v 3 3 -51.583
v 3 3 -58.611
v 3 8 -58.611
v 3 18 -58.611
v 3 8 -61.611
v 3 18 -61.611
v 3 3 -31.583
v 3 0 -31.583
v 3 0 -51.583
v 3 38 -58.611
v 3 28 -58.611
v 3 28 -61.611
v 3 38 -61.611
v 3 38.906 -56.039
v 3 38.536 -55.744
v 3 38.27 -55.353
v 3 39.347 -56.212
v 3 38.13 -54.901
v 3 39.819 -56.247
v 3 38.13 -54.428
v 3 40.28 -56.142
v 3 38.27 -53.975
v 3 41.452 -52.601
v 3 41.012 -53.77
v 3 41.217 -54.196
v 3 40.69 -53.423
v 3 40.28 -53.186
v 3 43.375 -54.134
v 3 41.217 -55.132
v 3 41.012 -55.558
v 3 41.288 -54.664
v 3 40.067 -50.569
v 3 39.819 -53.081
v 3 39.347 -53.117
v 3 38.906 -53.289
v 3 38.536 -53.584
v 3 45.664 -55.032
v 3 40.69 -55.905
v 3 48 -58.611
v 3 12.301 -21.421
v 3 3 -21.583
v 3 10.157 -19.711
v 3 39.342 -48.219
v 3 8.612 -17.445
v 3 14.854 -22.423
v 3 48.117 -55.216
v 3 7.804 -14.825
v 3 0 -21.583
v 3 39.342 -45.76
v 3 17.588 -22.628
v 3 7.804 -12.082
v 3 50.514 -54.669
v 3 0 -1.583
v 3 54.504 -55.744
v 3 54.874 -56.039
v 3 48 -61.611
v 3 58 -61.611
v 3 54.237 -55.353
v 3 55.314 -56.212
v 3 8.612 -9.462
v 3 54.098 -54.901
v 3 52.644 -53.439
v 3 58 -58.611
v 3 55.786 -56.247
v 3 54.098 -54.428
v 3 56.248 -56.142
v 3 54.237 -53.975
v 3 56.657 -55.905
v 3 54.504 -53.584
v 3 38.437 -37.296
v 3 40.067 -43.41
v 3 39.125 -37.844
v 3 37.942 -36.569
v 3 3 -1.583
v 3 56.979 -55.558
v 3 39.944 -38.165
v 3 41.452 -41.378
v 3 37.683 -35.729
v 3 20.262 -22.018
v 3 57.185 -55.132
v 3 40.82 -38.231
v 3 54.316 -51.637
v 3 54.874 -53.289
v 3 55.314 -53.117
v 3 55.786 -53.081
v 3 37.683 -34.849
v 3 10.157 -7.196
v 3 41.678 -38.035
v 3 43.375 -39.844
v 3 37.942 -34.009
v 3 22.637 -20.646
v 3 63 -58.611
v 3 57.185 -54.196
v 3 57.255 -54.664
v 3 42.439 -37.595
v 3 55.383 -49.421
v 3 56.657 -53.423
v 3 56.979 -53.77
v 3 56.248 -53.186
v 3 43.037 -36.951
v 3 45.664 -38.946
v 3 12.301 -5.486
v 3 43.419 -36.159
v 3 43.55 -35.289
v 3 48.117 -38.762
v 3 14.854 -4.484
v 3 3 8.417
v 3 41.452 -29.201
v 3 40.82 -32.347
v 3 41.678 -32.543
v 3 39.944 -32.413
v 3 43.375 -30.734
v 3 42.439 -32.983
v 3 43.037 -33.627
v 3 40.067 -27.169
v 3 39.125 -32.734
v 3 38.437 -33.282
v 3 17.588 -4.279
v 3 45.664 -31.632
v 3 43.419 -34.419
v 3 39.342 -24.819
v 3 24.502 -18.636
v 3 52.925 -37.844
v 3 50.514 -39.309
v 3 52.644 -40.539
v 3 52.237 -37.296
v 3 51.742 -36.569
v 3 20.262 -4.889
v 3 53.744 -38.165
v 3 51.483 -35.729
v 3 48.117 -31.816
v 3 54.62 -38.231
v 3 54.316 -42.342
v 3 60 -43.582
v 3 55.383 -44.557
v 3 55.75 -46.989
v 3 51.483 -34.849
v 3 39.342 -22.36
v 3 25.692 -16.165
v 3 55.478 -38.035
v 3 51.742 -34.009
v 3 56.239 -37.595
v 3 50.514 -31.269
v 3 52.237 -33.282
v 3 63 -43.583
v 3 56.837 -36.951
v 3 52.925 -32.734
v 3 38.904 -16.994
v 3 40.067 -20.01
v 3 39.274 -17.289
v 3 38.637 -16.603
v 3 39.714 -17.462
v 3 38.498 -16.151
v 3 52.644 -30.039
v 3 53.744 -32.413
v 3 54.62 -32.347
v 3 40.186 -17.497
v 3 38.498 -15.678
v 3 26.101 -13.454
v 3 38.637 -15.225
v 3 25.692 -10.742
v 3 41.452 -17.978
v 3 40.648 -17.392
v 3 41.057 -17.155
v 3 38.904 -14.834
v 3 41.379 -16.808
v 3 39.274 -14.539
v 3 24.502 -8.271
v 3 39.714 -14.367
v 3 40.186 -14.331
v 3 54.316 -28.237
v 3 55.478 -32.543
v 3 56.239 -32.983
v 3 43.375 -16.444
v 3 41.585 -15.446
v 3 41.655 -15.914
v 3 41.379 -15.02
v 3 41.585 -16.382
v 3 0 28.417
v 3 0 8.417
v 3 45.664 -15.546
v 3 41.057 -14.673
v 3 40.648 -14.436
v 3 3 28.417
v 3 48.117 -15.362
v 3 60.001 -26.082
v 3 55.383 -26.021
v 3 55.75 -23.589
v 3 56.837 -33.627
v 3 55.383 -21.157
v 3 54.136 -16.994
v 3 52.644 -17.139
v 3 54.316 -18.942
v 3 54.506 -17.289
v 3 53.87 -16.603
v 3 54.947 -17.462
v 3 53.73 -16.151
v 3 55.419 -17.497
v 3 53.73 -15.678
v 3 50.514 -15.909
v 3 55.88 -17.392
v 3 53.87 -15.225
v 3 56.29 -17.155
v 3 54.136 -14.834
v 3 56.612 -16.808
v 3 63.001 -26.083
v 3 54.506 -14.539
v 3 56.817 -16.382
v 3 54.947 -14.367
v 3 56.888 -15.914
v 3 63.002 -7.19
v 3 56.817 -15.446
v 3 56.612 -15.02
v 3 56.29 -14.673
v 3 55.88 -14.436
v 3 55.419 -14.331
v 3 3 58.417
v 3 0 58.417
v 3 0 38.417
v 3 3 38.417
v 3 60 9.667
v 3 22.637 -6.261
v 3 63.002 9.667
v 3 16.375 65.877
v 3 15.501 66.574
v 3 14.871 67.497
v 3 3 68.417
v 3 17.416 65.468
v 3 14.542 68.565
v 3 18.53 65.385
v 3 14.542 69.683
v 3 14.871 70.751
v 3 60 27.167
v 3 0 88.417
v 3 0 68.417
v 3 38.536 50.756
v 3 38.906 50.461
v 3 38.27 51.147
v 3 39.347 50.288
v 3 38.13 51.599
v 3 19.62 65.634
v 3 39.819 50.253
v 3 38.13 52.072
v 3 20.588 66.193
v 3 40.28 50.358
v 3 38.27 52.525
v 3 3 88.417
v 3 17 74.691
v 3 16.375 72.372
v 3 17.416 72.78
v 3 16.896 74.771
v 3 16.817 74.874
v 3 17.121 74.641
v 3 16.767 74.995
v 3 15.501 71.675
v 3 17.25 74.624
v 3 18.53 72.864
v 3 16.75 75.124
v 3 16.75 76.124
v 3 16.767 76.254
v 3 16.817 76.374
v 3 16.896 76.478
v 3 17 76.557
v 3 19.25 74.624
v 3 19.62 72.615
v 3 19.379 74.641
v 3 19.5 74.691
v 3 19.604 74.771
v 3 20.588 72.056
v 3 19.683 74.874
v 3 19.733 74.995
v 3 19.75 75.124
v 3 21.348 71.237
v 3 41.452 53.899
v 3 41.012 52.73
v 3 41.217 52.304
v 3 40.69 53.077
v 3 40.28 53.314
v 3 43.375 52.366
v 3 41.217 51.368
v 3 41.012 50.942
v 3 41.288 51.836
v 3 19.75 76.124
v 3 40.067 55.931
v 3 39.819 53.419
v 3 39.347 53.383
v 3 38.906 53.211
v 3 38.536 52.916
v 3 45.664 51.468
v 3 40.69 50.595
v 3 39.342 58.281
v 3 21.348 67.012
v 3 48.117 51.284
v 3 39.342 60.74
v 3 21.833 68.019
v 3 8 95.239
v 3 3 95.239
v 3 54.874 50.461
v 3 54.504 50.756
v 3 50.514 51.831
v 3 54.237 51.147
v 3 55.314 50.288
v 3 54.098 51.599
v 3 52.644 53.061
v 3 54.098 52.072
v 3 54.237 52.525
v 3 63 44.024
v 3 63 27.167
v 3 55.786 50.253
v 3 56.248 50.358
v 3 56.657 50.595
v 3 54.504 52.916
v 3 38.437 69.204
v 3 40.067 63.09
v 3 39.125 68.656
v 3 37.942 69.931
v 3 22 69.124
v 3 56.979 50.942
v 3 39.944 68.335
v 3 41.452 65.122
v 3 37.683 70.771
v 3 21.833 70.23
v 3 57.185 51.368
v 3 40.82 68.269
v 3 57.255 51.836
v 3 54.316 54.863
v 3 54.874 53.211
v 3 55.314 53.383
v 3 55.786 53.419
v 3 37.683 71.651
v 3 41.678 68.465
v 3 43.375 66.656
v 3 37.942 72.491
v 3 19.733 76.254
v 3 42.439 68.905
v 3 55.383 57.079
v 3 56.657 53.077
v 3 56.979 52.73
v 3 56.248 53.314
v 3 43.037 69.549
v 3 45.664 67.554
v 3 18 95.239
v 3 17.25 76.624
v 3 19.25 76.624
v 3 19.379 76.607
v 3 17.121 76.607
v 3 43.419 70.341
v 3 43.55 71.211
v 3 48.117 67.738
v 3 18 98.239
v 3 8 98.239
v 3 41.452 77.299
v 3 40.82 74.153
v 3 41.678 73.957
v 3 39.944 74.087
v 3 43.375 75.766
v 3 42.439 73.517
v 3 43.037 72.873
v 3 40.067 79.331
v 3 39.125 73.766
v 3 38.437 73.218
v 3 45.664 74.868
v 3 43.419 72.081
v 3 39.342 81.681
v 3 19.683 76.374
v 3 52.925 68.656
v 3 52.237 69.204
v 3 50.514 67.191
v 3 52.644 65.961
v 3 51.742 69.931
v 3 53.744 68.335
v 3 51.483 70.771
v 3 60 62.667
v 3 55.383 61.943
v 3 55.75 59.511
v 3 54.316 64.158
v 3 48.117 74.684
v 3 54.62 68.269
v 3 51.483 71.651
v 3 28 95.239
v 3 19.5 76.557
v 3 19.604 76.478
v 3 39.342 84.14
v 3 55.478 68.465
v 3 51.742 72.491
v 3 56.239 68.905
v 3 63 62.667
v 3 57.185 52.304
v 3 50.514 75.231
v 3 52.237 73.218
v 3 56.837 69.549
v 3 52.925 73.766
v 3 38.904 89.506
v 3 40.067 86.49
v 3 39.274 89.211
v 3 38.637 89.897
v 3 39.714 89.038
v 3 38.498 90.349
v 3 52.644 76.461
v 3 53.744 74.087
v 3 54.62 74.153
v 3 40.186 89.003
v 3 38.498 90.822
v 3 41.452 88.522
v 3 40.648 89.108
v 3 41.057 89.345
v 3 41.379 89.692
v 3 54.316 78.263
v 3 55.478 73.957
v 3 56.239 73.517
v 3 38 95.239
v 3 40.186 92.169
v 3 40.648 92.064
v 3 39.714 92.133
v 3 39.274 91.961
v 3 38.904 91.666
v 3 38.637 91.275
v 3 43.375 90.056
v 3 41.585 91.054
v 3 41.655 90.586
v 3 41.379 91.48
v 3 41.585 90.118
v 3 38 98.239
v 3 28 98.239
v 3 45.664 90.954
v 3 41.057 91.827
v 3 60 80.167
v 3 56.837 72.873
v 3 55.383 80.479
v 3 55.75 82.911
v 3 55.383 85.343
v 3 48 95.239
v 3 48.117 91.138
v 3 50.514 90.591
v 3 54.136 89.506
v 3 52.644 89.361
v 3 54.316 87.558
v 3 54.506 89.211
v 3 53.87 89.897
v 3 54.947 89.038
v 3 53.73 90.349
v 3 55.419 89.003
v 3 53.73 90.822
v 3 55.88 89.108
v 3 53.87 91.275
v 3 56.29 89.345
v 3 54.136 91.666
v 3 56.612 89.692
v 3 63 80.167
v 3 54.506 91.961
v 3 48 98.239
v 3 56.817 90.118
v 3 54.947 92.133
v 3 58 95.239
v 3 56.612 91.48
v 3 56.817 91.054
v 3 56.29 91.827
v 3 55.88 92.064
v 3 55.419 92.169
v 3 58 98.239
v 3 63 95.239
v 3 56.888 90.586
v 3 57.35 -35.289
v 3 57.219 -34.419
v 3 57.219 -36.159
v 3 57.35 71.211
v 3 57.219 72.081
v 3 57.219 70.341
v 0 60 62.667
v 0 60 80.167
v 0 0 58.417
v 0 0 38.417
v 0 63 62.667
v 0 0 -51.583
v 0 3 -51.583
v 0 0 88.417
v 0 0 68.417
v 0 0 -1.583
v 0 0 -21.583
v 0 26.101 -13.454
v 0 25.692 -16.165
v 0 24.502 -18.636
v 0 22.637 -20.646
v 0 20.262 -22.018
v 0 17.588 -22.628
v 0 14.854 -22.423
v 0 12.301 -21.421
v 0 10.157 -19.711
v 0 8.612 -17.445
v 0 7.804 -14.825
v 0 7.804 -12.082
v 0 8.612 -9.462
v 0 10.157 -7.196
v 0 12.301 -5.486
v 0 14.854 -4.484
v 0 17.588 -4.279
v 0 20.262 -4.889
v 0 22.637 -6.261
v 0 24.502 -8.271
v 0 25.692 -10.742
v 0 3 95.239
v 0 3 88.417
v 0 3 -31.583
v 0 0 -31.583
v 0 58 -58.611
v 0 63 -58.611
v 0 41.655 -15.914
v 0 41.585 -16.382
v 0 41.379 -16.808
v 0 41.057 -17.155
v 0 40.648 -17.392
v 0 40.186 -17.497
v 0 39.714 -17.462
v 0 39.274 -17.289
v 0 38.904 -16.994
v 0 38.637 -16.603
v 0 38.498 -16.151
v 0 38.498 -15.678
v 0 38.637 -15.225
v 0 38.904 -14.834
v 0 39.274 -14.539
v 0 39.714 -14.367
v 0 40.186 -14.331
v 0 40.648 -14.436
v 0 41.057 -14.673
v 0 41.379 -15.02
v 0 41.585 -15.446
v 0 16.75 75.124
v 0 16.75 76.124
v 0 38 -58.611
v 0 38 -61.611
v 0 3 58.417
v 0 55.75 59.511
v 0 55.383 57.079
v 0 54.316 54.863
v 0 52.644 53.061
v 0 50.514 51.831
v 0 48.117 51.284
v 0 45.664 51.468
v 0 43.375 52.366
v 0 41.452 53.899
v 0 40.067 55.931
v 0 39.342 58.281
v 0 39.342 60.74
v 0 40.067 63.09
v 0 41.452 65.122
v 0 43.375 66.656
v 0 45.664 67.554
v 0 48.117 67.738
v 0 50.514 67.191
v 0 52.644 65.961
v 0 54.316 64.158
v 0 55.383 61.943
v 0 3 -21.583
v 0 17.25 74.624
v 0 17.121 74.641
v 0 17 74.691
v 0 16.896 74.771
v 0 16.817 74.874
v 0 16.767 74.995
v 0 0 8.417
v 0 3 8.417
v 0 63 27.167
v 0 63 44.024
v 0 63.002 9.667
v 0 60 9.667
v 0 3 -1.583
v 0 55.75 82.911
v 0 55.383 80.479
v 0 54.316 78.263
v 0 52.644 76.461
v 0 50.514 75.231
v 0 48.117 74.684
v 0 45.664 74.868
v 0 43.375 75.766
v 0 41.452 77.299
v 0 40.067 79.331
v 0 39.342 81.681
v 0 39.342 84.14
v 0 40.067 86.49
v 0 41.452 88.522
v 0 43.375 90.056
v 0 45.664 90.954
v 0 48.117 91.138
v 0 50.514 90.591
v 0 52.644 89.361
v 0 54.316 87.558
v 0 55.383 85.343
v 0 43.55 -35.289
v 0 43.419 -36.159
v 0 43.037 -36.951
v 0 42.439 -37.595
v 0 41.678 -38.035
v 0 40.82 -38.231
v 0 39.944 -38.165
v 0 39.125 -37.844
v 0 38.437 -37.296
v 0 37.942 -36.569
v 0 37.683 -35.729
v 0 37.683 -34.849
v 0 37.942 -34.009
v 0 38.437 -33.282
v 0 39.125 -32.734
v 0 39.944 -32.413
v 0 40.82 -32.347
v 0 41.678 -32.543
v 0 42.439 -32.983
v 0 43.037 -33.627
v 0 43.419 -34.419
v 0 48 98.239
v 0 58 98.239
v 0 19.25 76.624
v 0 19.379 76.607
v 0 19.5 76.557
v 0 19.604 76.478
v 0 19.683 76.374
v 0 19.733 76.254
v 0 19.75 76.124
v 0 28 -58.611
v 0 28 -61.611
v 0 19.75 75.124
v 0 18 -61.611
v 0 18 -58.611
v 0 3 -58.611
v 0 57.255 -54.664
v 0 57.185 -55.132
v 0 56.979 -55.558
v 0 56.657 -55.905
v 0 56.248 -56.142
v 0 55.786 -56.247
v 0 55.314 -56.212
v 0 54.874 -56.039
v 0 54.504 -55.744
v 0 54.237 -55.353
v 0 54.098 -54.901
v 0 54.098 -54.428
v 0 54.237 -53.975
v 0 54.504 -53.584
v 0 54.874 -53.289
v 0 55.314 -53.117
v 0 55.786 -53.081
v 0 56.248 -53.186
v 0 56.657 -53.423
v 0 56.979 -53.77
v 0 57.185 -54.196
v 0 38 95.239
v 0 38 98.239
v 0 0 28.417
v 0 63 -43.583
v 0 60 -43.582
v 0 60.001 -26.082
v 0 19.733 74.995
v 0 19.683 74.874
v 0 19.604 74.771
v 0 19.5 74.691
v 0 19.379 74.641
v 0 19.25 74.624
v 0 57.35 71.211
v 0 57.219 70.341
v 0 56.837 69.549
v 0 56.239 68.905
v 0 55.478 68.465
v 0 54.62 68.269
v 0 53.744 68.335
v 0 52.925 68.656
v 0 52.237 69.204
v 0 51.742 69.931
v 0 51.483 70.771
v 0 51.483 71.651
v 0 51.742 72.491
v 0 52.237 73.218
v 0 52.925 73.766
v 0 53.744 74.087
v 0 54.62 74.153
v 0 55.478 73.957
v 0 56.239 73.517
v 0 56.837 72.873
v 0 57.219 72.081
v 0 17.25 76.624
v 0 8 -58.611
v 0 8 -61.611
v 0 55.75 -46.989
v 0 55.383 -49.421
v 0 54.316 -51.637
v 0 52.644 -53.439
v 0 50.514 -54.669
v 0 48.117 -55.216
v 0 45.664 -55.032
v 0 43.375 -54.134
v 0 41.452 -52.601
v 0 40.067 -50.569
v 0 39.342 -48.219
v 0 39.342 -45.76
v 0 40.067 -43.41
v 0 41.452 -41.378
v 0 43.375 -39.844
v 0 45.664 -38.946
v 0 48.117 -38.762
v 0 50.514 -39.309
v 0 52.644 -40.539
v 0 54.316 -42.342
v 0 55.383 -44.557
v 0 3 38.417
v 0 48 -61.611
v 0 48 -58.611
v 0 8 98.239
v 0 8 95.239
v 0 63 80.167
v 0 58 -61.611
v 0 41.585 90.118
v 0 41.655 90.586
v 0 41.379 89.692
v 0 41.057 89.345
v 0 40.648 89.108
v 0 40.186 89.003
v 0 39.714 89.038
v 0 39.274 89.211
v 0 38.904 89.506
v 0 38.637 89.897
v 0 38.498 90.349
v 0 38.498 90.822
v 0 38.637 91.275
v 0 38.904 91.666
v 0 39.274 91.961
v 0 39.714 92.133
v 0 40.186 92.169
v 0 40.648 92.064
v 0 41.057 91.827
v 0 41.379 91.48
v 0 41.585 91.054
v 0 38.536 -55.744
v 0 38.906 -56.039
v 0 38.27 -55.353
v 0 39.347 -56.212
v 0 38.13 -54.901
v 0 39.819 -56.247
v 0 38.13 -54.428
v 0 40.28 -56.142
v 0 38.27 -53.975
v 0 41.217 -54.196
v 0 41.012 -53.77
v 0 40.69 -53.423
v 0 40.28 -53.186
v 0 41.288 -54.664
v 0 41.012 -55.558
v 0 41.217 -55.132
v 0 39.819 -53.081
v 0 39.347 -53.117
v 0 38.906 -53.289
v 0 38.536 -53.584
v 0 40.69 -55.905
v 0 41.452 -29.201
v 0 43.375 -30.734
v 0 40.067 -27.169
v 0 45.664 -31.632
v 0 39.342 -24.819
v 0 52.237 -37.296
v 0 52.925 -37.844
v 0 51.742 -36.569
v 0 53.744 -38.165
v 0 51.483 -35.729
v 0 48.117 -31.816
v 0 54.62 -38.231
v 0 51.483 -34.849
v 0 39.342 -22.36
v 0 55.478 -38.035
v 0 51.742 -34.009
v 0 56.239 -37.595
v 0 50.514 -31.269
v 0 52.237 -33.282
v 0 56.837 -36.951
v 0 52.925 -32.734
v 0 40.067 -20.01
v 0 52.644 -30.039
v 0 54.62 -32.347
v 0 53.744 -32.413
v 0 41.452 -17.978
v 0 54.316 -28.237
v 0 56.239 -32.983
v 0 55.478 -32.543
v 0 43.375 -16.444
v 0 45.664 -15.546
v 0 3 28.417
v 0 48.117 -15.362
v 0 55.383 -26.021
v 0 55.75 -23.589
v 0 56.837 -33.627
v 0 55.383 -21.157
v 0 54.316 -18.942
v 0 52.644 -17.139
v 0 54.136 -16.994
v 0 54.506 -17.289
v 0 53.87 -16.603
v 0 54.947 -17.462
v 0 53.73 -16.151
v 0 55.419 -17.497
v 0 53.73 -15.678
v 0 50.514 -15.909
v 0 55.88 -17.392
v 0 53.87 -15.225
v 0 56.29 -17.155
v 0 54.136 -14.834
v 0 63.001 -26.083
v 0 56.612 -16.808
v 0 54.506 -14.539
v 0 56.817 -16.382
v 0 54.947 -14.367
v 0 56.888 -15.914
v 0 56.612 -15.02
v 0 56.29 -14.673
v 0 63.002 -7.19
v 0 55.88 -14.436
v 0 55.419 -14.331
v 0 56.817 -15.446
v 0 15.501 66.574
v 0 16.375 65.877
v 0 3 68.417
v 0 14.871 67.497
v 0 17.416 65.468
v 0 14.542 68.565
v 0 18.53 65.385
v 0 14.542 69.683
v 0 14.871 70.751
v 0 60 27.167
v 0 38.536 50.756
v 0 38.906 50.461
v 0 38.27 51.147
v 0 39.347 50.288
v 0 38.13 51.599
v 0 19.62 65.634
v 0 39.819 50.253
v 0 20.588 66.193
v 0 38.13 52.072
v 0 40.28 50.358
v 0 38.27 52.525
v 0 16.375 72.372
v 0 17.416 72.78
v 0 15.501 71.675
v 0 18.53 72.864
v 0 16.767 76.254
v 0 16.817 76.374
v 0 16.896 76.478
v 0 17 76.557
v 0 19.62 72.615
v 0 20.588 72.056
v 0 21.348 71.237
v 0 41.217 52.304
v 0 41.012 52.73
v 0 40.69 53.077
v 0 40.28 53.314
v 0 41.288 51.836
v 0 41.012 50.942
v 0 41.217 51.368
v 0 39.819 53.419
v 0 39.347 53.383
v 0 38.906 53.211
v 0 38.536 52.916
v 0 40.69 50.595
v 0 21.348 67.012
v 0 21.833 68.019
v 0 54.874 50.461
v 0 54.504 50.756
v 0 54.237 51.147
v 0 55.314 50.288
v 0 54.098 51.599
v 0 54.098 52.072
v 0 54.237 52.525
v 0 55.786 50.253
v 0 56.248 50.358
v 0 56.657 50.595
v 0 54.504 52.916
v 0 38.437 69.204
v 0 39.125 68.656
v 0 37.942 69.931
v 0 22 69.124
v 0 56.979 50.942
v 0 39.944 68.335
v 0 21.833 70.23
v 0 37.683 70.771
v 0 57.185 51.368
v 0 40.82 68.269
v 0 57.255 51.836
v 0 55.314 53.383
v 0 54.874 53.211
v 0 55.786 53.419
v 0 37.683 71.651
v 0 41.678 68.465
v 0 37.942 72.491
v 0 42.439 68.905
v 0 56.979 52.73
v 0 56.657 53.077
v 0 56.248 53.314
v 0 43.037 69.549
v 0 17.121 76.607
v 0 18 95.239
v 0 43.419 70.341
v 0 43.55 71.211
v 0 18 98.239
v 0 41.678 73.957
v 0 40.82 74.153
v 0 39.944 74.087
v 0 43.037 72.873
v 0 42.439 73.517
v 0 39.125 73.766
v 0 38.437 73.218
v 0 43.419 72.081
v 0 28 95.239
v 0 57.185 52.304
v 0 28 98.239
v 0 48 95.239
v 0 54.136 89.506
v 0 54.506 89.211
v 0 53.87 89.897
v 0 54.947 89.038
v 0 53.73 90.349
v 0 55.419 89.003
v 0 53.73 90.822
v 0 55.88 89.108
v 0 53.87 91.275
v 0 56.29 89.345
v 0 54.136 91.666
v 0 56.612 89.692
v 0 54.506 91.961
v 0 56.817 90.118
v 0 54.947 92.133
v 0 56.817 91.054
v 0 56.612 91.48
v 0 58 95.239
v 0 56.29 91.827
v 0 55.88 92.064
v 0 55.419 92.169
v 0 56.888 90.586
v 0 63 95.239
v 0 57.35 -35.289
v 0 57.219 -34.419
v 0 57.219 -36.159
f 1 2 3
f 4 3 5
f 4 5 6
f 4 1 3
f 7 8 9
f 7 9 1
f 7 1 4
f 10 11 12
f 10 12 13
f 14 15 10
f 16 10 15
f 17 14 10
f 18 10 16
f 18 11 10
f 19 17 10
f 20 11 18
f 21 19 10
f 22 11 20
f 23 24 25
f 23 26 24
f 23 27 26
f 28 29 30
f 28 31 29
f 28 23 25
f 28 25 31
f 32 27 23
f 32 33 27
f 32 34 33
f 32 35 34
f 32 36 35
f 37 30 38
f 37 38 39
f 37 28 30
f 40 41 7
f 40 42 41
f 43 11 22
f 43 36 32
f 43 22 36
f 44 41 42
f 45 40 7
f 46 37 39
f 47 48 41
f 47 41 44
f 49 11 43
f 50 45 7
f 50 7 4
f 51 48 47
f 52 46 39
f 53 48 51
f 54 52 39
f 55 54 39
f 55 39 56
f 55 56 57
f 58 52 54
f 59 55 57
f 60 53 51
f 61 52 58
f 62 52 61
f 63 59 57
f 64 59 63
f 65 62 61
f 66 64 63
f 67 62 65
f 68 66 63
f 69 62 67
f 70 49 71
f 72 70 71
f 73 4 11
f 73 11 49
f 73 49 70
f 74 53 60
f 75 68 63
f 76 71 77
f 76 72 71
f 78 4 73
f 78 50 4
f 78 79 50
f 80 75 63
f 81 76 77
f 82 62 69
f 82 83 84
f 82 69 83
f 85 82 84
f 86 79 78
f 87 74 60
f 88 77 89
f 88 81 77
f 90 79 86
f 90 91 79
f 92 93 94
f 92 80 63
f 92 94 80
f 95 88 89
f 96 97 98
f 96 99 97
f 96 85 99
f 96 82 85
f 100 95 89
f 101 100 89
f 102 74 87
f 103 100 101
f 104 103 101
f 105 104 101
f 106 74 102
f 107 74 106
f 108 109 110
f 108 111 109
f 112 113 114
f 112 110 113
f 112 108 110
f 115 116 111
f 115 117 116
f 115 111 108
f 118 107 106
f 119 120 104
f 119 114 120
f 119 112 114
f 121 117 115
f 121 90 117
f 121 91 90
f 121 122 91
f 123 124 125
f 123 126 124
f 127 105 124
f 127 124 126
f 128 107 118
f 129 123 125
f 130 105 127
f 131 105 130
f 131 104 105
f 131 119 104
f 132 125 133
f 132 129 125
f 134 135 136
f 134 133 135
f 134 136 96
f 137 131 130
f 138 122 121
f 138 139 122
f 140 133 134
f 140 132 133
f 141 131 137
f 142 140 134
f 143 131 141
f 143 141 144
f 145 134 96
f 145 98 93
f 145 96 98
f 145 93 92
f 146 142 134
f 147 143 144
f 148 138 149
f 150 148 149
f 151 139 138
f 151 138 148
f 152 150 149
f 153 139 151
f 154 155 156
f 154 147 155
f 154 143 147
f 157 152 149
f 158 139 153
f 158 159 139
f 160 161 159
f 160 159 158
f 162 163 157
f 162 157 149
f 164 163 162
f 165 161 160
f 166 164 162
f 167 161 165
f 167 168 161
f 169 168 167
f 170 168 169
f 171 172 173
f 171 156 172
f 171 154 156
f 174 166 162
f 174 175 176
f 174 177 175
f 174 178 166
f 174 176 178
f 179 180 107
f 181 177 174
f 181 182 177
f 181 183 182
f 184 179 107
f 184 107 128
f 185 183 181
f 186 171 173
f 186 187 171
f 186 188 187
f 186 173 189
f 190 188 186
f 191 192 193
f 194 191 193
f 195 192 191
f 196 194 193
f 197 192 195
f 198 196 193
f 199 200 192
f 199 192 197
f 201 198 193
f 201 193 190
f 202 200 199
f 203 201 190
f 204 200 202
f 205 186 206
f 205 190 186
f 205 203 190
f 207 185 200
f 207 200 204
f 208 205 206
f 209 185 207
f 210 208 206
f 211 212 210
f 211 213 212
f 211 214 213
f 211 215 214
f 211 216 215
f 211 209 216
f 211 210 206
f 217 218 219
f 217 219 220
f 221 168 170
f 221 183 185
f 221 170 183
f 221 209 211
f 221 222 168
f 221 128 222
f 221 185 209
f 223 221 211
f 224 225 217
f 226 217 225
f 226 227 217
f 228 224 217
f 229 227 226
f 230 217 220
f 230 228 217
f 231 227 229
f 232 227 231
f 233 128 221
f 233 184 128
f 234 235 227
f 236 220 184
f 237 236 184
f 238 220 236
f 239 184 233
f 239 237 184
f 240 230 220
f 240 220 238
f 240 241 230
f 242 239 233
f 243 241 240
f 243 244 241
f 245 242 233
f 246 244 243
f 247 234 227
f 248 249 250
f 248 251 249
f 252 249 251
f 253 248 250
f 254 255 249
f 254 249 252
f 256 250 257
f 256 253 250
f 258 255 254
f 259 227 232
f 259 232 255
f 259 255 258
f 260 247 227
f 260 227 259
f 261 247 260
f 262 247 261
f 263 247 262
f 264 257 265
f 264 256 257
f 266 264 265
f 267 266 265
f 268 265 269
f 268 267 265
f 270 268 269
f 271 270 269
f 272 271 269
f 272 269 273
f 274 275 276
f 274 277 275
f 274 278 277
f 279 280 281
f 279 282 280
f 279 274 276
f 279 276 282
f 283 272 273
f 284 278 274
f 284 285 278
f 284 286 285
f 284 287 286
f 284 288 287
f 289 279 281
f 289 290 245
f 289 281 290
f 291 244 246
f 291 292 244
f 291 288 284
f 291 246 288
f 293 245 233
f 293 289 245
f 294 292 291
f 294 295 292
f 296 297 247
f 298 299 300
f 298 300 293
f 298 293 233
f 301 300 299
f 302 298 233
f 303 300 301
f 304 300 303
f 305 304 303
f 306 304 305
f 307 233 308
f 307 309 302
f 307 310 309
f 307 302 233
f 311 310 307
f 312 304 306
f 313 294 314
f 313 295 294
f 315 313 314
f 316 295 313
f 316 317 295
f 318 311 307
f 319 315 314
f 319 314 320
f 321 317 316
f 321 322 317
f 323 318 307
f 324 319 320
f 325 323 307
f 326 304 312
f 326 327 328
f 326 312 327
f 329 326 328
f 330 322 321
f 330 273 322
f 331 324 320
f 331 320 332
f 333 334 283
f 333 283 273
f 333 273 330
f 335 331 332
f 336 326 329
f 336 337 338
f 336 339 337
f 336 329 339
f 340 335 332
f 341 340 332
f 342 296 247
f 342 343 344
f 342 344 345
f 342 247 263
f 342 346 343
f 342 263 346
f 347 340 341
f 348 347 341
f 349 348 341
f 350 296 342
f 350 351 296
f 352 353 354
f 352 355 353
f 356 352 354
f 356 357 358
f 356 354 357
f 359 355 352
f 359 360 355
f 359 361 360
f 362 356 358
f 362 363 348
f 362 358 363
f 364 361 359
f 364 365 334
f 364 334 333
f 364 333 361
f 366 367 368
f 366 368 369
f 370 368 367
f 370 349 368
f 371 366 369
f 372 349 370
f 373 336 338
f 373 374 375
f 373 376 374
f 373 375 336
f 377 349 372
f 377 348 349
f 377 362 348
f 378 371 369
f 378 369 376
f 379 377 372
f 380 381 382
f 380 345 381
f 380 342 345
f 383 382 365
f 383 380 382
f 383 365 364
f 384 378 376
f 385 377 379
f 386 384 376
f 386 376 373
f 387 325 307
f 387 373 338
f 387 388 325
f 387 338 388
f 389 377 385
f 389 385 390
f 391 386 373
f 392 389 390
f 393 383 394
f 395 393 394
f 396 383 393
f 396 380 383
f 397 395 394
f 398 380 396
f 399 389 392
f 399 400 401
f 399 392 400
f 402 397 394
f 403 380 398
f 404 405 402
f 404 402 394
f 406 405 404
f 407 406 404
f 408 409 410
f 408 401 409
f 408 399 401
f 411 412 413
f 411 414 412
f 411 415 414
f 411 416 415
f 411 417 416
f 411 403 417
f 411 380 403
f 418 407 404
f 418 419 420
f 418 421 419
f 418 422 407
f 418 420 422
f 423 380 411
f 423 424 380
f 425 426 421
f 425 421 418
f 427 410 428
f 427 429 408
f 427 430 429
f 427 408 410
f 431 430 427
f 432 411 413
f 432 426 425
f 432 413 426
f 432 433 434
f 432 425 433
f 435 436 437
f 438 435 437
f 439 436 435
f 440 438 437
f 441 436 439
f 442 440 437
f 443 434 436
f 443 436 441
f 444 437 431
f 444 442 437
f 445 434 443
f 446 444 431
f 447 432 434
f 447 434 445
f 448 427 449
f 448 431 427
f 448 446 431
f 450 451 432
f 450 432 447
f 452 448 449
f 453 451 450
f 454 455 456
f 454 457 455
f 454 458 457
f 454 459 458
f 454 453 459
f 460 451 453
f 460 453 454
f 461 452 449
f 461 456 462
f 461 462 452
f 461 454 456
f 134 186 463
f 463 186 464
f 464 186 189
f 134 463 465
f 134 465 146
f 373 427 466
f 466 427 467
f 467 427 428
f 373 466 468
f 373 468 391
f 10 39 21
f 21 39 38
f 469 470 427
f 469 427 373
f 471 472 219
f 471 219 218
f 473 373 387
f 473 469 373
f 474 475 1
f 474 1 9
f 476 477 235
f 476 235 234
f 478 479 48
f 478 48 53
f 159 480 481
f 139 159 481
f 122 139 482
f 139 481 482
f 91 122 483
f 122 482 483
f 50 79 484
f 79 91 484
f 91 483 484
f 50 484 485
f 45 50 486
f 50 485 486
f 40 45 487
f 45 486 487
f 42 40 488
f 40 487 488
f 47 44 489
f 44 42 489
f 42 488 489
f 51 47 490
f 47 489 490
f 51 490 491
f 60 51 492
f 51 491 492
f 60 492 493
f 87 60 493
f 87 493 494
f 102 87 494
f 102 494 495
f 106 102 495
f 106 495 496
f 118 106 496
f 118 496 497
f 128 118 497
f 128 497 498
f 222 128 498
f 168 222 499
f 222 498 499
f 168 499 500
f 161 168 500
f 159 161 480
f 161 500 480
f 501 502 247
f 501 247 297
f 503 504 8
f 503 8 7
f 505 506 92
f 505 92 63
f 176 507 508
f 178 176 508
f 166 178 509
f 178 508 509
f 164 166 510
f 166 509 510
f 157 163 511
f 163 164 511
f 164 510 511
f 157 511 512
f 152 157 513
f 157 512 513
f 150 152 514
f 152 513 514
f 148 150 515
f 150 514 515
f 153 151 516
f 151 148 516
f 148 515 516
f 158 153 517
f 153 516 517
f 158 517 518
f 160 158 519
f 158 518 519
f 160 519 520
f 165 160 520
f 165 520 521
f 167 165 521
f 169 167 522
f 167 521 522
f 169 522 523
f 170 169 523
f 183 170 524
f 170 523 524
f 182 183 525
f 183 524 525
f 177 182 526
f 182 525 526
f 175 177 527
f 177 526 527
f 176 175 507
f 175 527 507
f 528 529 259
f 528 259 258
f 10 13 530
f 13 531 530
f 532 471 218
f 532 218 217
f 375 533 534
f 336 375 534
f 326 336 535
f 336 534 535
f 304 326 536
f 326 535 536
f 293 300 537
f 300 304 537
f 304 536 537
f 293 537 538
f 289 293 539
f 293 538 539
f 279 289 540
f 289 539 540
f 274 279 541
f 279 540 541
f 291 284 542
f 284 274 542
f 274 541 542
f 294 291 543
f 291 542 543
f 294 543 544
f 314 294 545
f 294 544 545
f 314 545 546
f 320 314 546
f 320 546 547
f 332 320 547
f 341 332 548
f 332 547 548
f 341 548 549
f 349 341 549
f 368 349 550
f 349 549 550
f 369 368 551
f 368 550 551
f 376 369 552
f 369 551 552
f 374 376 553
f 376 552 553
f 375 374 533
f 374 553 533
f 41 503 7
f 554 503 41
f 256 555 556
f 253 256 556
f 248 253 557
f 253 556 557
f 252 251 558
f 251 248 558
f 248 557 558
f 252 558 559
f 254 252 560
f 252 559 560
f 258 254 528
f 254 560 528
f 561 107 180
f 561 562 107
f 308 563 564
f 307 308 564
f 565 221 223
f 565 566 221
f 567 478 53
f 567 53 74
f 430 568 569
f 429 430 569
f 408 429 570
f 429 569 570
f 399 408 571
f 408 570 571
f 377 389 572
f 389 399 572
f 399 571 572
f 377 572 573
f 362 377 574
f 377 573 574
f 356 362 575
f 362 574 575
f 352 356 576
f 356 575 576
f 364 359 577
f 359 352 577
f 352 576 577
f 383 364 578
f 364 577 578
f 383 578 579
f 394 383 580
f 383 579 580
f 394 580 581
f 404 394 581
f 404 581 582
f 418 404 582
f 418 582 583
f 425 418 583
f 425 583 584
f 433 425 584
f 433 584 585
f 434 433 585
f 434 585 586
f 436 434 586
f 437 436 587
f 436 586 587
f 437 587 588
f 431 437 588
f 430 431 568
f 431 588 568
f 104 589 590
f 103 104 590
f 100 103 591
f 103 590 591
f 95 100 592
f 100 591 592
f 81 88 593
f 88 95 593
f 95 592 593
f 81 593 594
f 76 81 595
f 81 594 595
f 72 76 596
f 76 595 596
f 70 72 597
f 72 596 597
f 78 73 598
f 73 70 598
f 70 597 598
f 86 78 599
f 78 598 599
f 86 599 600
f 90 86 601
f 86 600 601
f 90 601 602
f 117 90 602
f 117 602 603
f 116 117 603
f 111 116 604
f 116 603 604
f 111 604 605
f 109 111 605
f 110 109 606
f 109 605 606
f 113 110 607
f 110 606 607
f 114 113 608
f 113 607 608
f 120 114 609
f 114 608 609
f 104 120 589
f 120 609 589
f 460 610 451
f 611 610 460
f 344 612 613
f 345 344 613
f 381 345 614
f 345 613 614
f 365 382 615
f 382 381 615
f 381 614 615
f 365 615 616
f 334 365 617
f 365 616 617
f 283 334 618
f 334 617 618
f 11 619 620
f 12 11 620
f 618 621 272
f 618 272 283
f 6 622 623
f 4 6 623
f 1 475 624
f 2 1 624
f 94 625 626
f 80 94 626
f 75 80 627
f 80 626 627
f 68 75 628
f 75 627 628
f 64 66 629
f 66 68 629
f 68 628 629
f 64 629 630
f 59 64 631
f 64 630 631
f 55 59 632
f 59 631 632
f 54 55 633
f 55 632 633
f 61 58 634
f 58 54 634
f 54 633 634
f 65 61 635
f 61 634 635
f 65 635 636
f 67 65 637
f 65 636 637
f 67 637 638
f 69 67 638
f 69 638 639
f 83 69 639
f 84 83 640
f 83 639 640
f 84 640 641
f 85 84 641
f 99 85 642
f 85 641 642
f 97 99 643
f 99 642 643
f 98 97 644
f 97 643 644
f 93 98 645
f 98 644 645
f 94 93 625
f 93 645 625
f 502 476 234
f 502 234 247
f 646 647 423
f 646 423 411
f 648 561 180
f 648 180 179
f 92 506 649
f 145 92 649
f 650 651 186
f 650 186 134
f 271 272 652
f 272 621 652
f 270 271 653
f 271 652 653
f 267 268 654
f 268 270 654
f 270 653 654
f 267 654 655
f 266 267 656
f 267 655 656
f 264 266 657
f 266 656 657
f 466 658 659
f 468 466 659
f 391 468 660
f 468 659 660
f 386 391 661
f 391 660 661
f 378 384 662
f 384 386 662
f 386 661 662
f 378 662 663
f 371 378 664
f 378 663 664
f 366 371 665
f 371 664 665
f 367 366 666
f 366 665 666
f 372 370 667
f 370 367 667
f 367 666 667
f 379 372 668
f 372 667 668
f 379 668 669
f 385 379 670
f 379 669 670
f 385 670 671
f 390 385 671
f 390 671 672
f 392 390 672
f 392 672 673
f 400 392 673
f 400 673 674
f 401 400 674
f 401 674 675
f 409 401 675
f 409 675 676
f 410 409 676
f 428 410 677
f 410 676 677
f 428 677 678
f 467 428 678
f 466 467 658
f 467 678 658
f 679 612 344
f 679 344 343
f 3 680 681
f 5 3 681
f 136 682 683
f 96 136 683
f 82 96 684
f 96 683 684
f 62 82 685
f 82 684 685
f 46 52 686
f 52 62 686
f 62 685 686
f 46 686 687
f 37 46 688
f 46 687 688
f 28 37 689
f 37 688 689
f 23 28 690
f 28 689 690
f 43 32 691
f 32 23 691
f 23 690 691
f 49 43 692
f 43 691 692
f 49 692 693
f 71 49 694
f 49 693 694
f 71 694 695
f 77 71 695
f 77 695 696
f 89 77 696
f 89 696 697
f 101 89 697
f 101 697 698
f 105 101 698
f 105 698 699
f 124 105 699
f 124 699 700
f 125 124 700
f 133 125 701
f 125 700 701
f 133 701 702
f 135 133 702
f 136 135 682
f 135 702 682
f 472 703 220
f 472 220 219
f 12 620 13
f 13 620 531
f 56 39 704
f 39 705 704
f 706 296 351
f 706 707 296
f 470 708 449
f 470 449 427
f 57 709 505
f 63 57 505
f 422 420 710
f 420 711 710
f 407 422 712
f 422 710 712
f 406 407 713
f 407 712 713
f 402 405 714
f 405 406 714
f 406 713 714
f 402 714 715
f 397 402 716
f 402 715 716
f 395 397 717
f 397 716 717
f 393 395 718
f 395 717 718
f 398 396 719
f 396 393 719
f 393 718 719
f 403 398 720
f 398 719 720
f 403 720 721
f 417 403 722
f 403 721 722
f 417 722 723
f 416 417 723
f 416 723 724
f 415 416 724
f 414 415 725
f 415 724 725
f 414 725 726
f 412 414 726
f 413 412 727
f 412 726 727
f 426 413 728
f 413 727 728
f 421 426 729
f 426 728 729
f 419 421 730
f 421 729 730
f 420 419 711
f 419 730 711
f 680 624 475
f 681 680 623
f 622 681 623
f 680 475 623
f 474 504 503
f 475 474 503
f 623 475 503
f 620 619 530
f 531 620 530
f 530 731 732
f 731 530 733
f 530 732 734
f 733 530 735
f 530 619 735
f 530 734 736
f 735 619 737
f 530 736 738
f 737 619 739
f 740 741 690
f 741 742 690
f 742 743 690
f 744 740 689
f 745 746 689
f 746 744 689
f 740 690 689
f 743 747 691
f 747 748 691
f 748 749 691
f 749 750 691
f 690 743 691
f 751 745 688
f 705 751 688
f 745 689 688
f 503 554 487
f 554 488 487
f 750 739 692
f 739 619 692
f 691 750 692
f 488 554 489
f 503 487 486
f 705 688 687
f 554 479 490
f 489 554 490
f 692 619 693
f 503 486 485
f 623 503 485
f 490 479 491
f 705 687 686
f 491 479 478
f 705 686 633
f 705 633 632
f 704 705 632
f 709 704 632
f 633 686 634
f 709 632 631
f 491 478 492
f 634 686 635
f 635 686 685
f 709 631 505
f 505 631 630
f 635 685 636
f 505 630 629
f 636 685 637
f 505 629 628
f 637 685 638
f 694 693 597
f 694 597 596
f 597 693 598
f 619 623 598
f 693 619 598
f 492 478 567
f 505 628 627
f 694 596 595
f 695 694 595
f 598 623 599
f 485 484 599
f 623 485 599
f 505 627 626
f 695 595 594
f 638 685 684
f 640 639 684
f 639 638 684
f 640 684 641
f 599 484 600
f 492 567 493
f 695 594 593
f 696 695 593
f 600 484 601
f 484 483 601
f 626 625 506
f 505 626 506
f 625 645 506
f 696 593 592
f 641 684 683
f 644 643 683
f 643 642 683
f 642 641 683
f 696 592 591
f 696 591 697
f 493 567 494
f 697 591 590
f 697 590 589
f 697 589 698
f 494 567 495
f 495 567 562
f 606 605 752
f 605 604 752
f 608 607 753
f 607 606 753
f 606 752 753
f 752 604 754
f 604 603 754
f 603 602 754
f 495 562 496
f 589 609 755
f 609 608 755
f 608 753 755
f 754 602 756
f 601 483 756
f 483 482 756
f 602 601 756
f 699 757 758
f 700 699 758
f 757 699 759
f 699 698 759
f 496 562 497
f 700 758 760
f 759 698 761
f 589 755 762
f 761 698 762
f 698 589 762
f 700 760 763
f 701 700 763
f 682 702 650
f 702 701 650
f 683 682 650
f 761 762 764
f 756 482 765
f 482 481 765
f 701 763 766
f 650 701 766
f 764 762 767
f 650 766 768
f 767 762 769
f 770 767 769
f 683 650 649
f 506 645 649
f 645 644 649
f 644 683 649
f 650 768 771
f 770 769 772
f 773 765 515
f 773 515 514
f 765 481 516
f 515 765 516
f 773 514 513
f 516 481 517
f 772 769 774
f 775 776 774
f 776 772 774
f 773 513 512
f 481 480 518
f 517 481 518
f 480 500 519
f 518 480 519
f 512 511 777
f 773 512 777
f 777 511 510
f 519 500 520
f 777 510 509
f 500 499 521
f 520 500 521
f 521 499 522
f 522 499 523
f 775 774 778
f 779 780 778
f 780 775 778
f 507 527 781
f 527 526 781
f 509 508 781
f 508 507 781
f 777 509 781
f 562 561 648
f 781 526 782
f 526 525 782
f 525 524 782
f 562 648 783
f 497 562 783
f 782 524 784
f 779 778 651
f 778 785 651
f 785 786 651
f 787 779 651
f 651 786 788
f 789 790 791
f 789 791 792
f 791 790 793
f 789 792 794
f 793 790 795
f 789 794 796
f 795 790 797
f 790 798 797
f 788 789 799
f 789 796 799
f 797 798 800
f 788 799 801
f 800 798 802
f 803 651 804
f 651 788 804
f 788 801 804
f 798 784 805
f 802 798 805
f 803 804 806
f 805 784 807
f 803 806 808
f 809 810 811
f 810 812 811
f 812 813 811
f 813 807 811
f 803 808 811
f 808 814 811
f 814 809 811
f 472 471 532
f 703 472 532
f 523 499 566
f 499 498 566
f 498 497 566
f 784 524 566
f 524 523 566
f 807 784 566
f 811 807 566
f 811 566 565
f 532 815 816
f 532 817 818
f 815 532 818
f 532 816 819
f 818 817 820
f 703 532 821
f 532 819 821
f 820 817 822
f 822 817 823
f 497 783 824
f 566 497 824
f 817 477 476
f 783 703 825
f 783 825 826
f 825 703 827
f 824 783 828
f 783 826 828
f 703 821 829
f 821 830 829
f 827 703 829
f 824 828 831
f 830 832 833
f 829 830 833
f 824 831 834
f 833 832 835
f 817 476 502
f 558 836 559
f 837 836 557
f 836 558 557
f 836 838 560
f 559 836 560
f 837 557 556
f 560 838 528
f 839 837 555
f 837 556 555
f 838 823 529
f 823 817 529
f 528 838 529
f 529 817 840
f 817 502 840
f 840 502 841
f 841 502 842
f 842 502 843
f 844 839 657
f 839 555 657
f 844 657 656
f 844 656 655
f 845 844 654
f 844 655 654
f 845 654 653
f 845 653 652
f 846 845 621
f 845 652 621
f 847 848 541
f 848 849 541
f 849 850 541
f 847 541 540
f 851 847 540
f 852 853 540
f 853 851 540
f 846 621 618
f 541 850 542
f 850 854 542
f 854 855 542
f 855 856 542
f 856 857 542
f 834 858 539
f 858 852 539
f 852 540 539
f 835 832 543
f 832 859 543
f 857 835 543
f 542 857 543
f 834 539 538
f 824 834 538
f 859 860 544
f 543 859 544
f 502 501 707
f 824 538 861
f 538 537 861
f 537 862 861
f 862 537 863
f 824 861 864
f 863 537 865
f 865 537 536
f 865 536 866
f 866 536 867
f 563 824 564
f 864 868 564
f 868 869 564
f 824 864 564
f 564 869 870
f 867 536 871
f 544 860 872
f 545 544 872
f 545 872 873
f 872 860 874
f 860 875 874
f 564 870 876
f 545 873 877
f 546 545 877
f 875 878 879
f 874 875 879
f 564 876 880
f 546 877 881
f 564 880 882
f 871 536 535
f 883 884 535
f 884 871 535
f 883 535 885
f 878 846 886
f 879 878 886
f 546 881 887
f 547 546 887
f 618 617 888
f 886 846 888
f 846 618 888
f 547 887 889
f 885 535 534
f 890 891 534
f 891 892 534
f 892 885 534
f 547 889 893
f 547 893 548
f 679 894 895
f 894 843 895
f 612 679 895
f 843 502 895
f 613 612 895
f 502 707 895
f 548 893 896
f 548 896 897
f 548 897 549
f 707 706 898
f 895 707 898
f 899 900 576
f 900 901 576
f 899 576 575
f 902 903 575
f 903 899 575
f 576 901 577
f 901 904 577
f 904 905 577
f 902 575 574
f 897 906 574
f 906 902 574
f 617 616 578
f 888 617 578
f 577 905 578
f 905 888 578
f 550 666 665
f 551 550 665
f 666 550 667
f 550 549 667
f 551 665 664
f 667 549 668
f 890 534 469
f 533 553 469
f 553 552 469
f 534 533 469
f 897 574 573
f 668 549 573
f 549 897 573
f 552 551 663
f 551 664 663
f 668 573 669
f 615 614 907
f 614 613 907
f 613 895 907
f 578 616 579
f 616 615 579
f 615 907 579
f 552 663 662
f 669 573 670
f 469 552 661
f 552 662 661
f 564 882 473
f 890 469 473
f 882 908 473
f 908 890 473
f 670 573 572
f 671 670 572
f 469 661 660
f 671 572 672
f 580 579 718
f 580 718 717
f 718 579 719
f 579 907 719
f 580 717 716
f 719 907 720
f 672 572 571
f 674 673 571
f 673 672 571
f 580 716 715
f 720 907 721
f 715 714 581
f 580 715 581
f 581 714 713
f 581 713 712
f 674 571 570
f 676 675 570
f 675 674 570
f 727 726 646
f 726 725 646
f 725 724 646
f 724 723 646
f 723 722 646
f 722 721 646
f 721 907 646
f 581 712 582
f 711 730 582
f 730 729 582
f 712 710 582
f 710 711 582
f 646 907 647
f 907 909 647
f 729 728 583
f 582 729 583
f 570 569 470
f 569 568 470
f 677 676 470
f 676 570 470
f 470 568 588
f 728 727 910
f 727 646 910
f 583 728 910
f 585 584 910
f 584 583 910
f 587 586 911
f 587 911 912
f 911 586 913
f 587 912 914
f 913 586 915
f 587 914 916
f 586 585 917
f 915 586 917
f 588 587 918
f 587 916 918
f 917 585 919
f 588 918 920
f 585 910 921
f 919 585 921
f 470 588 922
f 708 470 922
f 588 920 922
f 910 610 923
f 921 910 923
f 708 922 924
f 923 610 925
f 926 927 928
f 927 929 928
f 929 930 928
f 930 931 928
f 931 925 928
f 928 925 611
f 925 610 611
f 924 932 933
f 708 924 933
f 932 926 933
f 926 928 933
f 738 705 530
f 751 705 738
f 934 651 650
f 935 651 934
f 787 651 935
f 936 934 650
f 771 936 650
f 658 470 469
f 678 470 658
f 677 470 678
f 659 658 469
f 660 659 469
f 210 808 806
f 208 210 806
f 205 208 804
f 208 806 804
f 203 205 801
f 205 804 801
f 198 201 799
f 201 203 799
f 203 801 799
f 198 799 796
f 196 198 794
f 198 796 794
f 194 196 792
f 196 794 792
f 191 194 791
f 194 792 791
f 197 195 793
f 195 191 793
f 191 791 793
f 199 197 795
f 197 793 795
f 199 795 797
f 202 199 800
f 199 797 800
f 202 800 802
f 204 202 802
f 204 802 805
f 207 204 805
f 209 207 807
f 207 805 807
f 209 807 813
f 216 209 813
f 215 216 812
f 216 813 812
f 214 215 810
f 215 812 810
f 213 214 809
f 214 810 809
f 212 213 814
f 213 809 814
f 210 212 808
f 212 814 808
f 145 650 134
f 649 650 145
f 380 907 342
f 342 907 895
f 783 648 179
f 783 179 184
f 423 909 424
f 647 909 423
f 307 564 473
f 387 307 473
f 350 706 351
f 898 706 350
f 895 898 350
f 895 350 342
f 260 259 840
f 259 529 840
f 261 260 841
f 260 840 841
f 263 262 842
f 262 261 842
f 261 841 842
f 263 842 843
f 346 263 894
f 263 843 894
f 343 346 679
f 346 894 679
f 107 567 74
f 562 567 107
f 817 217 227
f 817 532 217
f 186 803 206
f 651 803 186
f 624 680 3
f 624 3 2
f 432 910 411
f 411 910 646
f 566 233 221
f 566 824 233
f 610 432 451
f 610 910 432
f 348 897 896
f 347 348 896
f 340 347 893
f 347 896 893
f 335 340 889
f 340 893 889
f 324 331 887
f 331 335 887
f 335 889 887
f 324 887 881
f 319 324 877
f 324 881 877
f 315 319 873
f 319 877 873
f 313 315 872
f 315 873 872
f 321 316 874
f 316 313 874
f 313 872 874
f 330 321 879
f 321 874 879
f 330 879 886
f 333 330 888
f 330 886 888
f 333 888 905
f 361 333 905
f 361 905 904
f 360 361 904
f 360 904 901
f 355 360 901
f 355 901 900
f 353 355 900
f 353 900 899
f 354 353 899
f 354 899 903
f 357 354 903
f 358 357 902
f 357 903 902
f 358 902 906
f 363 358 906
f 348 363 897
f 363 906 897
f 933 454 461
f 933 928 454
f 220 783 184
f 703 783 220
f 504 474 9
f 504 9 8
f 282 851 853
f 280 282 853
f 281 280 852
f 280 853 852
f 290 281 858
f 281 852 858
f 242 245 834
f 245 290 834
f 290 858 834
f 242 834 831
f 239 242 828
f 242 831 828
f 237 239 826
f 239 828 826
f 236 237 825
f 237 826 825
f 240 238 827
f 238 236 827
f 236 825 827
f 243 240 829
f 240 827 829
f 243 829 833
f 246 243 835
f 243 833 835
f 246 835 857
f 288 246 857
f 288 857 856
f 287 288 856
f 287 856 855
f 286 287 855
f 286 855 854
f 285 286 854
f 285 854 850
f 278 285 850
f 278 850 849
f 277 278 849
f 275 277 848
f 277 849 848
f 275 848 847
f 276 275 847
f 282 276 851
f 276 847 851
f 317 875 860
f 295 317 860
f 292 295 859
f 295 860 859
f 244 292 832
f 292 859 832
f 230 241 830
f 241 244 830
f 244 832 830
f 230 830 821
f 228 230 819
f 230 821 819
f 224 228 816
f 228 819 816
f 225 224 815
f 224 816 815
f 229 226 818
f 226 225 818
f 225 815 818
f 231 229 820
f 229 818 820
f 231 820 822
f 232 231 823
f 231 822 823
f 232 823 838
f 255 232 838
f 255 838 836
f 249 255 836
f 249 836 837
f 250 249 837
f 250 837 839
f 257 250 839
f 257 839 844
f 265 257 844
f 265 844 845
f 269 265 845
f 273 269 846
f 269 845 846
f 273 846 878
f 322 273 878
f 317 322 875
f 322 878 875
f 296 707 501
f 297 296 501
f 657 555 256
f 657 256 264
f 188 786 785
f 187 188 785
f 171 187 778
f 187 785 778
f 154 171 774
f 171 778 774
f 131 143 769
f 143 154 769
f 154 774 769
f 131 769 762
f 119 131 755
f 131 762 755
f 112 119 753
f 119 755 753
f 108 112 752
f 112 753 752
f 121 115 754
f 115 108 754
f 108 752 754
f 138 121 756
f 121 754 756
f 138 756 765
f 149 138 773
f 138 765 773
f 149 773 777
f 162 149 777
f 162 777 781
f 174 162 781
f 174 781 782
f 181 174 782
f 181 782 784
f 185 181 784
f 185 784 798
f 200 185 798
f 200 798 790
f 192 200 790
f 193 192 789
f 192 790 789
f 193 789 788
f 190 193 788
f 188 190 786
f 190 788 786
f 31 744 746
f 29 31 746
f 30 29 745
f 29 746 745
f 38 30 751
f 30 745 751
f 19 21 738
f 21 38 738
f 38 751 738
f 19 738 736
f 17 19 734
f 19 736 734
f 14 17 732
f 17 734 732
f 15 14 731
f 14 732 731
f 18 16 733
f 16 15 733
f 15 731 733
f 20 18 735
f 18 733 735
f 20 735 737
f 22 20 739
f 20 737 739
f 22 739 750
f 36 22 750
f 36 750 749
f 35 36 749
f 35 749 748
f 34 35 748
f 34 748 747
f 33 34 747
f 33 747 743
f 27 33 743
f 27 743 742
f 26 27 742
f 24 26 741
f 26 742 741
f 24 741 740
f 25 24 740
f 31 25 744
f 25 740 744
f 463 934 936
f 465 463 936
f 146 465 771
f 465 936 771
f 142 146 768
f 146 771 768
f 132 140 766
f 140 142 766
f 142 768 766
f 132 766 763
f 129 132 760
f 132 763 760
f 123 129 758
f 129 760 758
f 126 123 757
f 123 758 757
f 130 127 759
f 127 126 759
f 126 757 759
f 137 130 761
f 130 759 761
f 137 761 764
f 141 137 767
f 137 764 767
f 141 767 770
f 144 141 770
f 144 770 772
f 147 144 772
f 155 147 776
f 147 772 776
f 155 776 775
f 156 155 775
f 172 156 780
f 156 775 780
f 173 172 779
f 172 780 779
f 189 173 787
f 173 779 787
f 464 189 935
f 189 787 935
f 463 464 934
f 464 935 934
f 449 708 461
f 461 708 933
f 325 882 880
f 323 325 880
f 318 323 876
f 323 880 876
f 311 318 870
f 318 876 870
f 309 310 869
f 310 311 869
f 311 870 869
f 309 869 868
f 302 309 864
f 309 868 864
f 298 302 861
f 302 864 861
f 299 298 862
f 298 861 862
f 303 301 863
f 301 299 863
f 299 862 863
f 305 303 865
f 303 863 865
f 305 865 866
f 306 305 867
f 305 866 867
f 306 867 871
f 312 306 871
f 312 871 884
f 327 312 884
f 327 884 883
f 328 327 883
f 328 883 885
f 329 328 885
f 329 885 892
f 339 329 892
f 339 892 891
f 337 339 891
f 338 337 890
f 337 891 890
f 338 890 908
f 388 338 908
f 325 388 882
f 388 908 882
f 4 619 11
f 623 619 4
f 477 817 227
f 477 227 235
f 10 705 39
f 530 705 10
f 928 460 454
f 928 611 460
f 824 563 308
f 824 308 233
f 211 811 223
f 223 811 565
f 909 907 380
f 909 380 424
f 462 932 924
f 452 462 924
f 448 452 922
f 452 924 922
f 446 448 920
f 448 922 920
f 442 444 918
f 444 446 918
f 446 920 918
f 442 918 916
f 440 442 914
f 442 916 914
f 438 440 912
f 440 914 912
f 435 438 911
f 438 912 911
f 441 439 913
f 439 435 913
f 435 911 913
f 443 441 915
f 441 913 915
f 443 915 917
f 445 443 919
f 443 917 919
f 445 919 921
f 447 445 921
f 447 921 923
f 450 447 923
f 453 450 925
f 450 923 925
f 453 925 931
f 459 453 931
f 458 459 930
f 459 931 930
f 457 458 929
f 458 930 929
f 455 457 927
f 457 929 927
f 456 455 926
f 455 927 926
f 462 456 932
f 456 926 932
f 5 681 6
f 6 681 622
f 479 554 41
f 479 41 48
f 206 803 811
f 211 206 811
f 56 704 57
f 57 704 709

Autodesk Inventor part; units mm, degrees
ref_plane "YZ Plane" through (0, 0, 0) normal (1, 0, 0) x (0, 1, 0)
ref_plane "XZ Plane" through (0, 0, 0) normal (0, 1, 0) x (-1, 0, 0)
ref_plane "XY Plane" through (0, 0, 0) normal (0, 0, 1) x (1, 0, 0)
sketch "Sketch1" plane through (0, 0, 0) normal (1, 0, 0) x (0, 1, 0)
  line L0 (63, -58.6109) -> (63.0005, -43.5826)
  line L1 (60.0005, -43.5825) -> (63.0005, -43.5826)
  line L2 (60.0011, -26.0825) -> (60.0005, -43.5825)
  line L3 (63.0011, -26.0826) -> (60.0011, -26.0825)
  line L4 (63.0011, -26.0826) -> (63.0018, -7.1898)
  line L5 (63.0018, -7.1898) -> (63.0023, 9.6674)
  line L6 (60, 9.6674) -> (63.0023, 9.6674)
  line L7 (60, 27.1674) -> (60, 9.6674)
  line L8 (63, 27.1674) -> (60, 27.1674)
  line L9 (63, 27.1674) -> (63, 44.0245)
  line L10 (63, 44.0245) -> (63, 62.6674)
  line L11 (60, 62.6674) -> (63, 62.6674)
  line L12 (60, 80.1674) -> (60, 62.6674)
  line L13 (63, 80.1674) -> (60, 80.1674)
  line L14 (63, 80.1674) -> (63, 95.2386)
  circle A0 centre (18.25, 69.1244) radius 3.75
  line L15 (16.75, 76.1244) -> (16.75, 75.1244)
  line L16 (17.25, 74.6244) -> (19.25, 74.6244)
  arc A1 (19.25, 74.6244) -> (19.75, 75.1244) centre (19.25, 75.1244) ccw
  line L17 (19.75, 75.1244) -> (19.75, 76.1244)
  arc A2 (19.75, 76.1244) -> (19.25, 76.6244) centre (19.25, 76.1244) ccw
  line L18 (19.25, 76.6244) -> (17.25, 76.6244)
  arc A3 (17.25, 76.6244) -> (16.75, 76.1244) centre (17.25, 76.1244) ccw
  arc A4 (16.75, 75.1244) -> (17.25, 74.6244) centre (17.25, 75.1244) ccw
  circle A5 centre (55.3, -15.9142) radius 1.5875
  circle A6 centre (54.4, -35.289) radius 2.95
  circle A7 centre (47.5, -23.5892) radius 8.25
  circle A8 centre (47.5, -46.9892) radius 8.25
  circle A9 centre (39.7, -54.6642) radius 1.5875
  circle A10 centre (40.6, -35.289) radius 2.95
  circle A11 centre (40.0677, -15.9142) radius 1.5875
  circle A12 centre (55.6677, -54.6642) radius 1.5875
  line L19 (55.3, -15.9142) -> (39.7, -54.6642) construction
  line L20 (55.6677, -54.6642) -> (40.0677, -15.9142) construction
  circle A13 centre (16.9008, -13.4535) radius 9.2
  circle A14 centre (55.3, 90.5858) radius 1.5875
  circle A15 centre (40.0677, 90.5858) radius 1.5875
  circle A16 centre (47.5, 82.9108) radius 8.25
  circle A17 centre (54.4, 71.211) radius 2.95
  circle A18 centre (40.6, 71.211) radius 2.95
  circle A19 centre (47.5, 59.5108) radius 8.25
  circle A20 centre (39.7, 51.8358) radius 1.5875
  circle A21 centre (55.6677, 51.8358) radius 1.5875
  line L21 (55.3, 90.5858) -> (39.7, 51.8358) construction
  line L22 (55.6677, 51.8358) -> (40.0677, 90.5858) construction
  line L23 (3, 8.4171) -> (0, 8.4171)
  line L24 (0, 8.4171) -> (0, 28.4171)
  line L25 (0, 28.4171) -> (3, 28.4171)
  line L26 (3, 28.4171) -> (3, 8.4171) construction
  line L27 (3, 8.4171) -> (0, 28.4171) construction
  line L28 (0, 8.4171) -> (3, 28.4171) construction
  line L29 (31.5, 18.3138) -> (31.5, 31.364) construction
  line L30 (31.5, 18.3138) -> (40.6, 18.3138) construction
  line L31 (3, -21.5829) -> (0, -21.5829)
  line L32 (0, -21.5829) -> (0, -1.5829)
  line L33 (0, -1.5829) -> (3, -1.5829)
  line L34 (3, -51.5829) -> (0, -51.5829)
  line L35 (0, -51.5829) -> (0, -31.5829)
  line L36 (0, -31.5829) -> (3, -31.5829)
  line L37 (3, 38.4171) -> (0, 38.4171)
  line L38 (0, 38.4171) -> (0, 58.4171)
  line L39 (0, 58.4171) -> (3, 58.4171)
  line L40 (3, 8.4171) -> (0, 8.4171)
  line L41 (0, 8.4171) -> (0, 28.4171)
  line L42 (0, 28.4171) -> (3, 28.4171)
  line L43 (3, -21.5829) -> (0, -21.5829)
  line L44 (0, -21.5829) -> (0, -1.5829)
  line L45 (0, -1.5829) -> (3, -1.5829)
  line L46 (3, 68.4171) -> (0, 68.4171)
  line L47 (0, 68.4171) -> (0, 88.4171)
  line L48 (0, 88.4171) -> (3, 88.4171)
  line L49 (3, 38.4171) -> (0, 38.4171)
  line L50 (0, 38.4171) -> (0, 58.4171)
  line L51 (0, 58.4171) -> (3, 58.4171)
  line L52 (3, 8.4171) -> (0, 8.4171)
  line L53 (0, 8.4171) -> (0, 28.4171)
  line L54 (0, 28.4171) -> (3, 28.4171)
  line L55 (3, -51.5829) -> (3, -58.6109)
  line L56 (3, -31.5829) -> (3, -21.5829)
  line L57 (3, -1.5829) -> (3, 8.4171)
  line L58 (3, 28.4171) -> (3, 38.4171)
  line L59 (3, 58.4171) -> (3, 68.4171)
  line L60 (3, 88.4171) -> (3, 95.2386)
  line L61 (28, -58.6109) -> (28, -61.6109)
  line L62 (28, -61.6109) -> (38, -61.6109)
  line L63 (38, -61.6109) -> (38, -58.6109)
  line L64 (38, -58.6109) -> (28, -61.6109) construction
  line L65 (28, -58.6109) -> (38, -61.6109) construction
  line L66 (48, -58.6109) -> (48, -61.6109)
  line L67 (48, -61.6109) -> (58, -61.6109)
  line L68 (58, -61.6109) -> (58, -58.6109)
  line L69 (58, -58.6109) -> (48, -61.6109) construction
  line L70 (48, -58.6109) -> (58, -61.6109) construction
  line L71 (8, -58.6109) -> (8, -61.6109)
  line L72 (8, -61.6109) -> (18, -61.6109)
  line L73 (18, -61.6109) -> (18, -58.6109)
  line L74 (18, -58.6109) -> (8, -61.6109) construction
  line L75 (8, -58.6109) -> (18, -61.6109) construction
  line L76 (28, -58.6109) -> (28, -61.6109)
  line L77 (28, -61.6109) -> (38, -61.6109)
  line L78 (38, -61.6109) -> (38, -58.6109)
  line L79 (38, -58.6109) -> (28, -61.6109) construction
  line L80 (28, -58.6109) -> (38, -61.6109) construction
  line L81 (63, -58.6109) -> (58, -58.6109)
  line L82 (48, -58.6109) -> (38, -58.6109)
  line L83 (28, -58.6109) -> (18, -58.6109)
  line L84 (8, -58.6109) -> (3, -58.6109)
  line L85 (28, 95.2386) -> (28, 98.2386)
  line L86 (28, 98.2386) -> (38, 98.2386)
  line L87 (38, 98.2386) -> (38, 95.2386)
  line L88 (38, 95.2386) -> (28, 98.2386) construction
  line L89 (28, 95.2386) -> (38, 98.2386) construction
  line L90 (58, 98.2386) -> (58, 95.2386)
  line L91 (48, 98.2386) -> (58, 98.2386)
  line L92 (58, 95.2386) -> (48, 98.2386) construction
  line L93 (48, 95.2386) -> (58, 98.2386) construction
  line L94 (48, 95.2386) -> (48, 98.2386)
  line L95 (18, 98.2386) -> (18, 95.2386)
  line L96 (8, 98.2386) -> (18, 98.2386)
  line L97 (18, 95.2386) -> (8, 98.2386) construction
  line L98 (8, 95.2386) -> (18, 98.2386) construction
  line L99 (8, 95.2386) -> (8, 98.2386)
  line L100 (38, 98.2386) -> (38, 95.2386)
  line L101 (28, 98.2386) -> (38, 98.2386)
  line L102 (38, 95.2386) -> (28, 98.2386) construction
  line L103 (28, 95.2386) -> (38, 98.2386) construction
  line L104 (28, 95.2386) -> (28, 98.2386)
  line L105 (48, 95.2386) -> (38, 95.2386)
  line L106 (28, 95.2386) -> (18, 95.2386)
  line L107 (58, 95.2386) -> (63, 95.2386)
  line L108 (8, 95.2386) -> (3, 95.2386)
  point P0 (0, 0)
  point P1 (47.6838, -34.8326)
  point P2 (47.6838, -34.8326)
  point P3 (47.6838, -34.8326)
  point P4 (47.6838, 71.6674)
  point P5 (47.6838, 71.6674)
  point P6 (47.6838, 71.6674)
  point P7 (47.6838, 71.6674)
  point P8 (1.5, 18.4171)
  point P9 (60, 18.4174)
  point P10 (33, -60.1109)
  point P11 (53, -60.1109)
  point P12 (13, -60.1109)
  point P13 (33, -60.1109)
  point P14 (33, 96.7386)
  point P15 (53, 96.7386)
  point P16 (13, 96.7386)
  point P17 (33, 96.7386)
  dimension "d0" = 7.8
  dimension "d1" = 7.8
  dimension "d2" = 7.8
  dimension "d3" = 7.8
  dimension "d7" = 3
  dimension "d8" = 20
  dimension "d11" = 30
  dimension "d14" = 30
  dimension "d17" = 10
  dimension "d18" = 3
  dimension "d21" = 20
  dimension "d24" = 20
extrude "Extrusion1" add sketch "Sketch1" along normal blind 3
properties part number "srf kiri"
